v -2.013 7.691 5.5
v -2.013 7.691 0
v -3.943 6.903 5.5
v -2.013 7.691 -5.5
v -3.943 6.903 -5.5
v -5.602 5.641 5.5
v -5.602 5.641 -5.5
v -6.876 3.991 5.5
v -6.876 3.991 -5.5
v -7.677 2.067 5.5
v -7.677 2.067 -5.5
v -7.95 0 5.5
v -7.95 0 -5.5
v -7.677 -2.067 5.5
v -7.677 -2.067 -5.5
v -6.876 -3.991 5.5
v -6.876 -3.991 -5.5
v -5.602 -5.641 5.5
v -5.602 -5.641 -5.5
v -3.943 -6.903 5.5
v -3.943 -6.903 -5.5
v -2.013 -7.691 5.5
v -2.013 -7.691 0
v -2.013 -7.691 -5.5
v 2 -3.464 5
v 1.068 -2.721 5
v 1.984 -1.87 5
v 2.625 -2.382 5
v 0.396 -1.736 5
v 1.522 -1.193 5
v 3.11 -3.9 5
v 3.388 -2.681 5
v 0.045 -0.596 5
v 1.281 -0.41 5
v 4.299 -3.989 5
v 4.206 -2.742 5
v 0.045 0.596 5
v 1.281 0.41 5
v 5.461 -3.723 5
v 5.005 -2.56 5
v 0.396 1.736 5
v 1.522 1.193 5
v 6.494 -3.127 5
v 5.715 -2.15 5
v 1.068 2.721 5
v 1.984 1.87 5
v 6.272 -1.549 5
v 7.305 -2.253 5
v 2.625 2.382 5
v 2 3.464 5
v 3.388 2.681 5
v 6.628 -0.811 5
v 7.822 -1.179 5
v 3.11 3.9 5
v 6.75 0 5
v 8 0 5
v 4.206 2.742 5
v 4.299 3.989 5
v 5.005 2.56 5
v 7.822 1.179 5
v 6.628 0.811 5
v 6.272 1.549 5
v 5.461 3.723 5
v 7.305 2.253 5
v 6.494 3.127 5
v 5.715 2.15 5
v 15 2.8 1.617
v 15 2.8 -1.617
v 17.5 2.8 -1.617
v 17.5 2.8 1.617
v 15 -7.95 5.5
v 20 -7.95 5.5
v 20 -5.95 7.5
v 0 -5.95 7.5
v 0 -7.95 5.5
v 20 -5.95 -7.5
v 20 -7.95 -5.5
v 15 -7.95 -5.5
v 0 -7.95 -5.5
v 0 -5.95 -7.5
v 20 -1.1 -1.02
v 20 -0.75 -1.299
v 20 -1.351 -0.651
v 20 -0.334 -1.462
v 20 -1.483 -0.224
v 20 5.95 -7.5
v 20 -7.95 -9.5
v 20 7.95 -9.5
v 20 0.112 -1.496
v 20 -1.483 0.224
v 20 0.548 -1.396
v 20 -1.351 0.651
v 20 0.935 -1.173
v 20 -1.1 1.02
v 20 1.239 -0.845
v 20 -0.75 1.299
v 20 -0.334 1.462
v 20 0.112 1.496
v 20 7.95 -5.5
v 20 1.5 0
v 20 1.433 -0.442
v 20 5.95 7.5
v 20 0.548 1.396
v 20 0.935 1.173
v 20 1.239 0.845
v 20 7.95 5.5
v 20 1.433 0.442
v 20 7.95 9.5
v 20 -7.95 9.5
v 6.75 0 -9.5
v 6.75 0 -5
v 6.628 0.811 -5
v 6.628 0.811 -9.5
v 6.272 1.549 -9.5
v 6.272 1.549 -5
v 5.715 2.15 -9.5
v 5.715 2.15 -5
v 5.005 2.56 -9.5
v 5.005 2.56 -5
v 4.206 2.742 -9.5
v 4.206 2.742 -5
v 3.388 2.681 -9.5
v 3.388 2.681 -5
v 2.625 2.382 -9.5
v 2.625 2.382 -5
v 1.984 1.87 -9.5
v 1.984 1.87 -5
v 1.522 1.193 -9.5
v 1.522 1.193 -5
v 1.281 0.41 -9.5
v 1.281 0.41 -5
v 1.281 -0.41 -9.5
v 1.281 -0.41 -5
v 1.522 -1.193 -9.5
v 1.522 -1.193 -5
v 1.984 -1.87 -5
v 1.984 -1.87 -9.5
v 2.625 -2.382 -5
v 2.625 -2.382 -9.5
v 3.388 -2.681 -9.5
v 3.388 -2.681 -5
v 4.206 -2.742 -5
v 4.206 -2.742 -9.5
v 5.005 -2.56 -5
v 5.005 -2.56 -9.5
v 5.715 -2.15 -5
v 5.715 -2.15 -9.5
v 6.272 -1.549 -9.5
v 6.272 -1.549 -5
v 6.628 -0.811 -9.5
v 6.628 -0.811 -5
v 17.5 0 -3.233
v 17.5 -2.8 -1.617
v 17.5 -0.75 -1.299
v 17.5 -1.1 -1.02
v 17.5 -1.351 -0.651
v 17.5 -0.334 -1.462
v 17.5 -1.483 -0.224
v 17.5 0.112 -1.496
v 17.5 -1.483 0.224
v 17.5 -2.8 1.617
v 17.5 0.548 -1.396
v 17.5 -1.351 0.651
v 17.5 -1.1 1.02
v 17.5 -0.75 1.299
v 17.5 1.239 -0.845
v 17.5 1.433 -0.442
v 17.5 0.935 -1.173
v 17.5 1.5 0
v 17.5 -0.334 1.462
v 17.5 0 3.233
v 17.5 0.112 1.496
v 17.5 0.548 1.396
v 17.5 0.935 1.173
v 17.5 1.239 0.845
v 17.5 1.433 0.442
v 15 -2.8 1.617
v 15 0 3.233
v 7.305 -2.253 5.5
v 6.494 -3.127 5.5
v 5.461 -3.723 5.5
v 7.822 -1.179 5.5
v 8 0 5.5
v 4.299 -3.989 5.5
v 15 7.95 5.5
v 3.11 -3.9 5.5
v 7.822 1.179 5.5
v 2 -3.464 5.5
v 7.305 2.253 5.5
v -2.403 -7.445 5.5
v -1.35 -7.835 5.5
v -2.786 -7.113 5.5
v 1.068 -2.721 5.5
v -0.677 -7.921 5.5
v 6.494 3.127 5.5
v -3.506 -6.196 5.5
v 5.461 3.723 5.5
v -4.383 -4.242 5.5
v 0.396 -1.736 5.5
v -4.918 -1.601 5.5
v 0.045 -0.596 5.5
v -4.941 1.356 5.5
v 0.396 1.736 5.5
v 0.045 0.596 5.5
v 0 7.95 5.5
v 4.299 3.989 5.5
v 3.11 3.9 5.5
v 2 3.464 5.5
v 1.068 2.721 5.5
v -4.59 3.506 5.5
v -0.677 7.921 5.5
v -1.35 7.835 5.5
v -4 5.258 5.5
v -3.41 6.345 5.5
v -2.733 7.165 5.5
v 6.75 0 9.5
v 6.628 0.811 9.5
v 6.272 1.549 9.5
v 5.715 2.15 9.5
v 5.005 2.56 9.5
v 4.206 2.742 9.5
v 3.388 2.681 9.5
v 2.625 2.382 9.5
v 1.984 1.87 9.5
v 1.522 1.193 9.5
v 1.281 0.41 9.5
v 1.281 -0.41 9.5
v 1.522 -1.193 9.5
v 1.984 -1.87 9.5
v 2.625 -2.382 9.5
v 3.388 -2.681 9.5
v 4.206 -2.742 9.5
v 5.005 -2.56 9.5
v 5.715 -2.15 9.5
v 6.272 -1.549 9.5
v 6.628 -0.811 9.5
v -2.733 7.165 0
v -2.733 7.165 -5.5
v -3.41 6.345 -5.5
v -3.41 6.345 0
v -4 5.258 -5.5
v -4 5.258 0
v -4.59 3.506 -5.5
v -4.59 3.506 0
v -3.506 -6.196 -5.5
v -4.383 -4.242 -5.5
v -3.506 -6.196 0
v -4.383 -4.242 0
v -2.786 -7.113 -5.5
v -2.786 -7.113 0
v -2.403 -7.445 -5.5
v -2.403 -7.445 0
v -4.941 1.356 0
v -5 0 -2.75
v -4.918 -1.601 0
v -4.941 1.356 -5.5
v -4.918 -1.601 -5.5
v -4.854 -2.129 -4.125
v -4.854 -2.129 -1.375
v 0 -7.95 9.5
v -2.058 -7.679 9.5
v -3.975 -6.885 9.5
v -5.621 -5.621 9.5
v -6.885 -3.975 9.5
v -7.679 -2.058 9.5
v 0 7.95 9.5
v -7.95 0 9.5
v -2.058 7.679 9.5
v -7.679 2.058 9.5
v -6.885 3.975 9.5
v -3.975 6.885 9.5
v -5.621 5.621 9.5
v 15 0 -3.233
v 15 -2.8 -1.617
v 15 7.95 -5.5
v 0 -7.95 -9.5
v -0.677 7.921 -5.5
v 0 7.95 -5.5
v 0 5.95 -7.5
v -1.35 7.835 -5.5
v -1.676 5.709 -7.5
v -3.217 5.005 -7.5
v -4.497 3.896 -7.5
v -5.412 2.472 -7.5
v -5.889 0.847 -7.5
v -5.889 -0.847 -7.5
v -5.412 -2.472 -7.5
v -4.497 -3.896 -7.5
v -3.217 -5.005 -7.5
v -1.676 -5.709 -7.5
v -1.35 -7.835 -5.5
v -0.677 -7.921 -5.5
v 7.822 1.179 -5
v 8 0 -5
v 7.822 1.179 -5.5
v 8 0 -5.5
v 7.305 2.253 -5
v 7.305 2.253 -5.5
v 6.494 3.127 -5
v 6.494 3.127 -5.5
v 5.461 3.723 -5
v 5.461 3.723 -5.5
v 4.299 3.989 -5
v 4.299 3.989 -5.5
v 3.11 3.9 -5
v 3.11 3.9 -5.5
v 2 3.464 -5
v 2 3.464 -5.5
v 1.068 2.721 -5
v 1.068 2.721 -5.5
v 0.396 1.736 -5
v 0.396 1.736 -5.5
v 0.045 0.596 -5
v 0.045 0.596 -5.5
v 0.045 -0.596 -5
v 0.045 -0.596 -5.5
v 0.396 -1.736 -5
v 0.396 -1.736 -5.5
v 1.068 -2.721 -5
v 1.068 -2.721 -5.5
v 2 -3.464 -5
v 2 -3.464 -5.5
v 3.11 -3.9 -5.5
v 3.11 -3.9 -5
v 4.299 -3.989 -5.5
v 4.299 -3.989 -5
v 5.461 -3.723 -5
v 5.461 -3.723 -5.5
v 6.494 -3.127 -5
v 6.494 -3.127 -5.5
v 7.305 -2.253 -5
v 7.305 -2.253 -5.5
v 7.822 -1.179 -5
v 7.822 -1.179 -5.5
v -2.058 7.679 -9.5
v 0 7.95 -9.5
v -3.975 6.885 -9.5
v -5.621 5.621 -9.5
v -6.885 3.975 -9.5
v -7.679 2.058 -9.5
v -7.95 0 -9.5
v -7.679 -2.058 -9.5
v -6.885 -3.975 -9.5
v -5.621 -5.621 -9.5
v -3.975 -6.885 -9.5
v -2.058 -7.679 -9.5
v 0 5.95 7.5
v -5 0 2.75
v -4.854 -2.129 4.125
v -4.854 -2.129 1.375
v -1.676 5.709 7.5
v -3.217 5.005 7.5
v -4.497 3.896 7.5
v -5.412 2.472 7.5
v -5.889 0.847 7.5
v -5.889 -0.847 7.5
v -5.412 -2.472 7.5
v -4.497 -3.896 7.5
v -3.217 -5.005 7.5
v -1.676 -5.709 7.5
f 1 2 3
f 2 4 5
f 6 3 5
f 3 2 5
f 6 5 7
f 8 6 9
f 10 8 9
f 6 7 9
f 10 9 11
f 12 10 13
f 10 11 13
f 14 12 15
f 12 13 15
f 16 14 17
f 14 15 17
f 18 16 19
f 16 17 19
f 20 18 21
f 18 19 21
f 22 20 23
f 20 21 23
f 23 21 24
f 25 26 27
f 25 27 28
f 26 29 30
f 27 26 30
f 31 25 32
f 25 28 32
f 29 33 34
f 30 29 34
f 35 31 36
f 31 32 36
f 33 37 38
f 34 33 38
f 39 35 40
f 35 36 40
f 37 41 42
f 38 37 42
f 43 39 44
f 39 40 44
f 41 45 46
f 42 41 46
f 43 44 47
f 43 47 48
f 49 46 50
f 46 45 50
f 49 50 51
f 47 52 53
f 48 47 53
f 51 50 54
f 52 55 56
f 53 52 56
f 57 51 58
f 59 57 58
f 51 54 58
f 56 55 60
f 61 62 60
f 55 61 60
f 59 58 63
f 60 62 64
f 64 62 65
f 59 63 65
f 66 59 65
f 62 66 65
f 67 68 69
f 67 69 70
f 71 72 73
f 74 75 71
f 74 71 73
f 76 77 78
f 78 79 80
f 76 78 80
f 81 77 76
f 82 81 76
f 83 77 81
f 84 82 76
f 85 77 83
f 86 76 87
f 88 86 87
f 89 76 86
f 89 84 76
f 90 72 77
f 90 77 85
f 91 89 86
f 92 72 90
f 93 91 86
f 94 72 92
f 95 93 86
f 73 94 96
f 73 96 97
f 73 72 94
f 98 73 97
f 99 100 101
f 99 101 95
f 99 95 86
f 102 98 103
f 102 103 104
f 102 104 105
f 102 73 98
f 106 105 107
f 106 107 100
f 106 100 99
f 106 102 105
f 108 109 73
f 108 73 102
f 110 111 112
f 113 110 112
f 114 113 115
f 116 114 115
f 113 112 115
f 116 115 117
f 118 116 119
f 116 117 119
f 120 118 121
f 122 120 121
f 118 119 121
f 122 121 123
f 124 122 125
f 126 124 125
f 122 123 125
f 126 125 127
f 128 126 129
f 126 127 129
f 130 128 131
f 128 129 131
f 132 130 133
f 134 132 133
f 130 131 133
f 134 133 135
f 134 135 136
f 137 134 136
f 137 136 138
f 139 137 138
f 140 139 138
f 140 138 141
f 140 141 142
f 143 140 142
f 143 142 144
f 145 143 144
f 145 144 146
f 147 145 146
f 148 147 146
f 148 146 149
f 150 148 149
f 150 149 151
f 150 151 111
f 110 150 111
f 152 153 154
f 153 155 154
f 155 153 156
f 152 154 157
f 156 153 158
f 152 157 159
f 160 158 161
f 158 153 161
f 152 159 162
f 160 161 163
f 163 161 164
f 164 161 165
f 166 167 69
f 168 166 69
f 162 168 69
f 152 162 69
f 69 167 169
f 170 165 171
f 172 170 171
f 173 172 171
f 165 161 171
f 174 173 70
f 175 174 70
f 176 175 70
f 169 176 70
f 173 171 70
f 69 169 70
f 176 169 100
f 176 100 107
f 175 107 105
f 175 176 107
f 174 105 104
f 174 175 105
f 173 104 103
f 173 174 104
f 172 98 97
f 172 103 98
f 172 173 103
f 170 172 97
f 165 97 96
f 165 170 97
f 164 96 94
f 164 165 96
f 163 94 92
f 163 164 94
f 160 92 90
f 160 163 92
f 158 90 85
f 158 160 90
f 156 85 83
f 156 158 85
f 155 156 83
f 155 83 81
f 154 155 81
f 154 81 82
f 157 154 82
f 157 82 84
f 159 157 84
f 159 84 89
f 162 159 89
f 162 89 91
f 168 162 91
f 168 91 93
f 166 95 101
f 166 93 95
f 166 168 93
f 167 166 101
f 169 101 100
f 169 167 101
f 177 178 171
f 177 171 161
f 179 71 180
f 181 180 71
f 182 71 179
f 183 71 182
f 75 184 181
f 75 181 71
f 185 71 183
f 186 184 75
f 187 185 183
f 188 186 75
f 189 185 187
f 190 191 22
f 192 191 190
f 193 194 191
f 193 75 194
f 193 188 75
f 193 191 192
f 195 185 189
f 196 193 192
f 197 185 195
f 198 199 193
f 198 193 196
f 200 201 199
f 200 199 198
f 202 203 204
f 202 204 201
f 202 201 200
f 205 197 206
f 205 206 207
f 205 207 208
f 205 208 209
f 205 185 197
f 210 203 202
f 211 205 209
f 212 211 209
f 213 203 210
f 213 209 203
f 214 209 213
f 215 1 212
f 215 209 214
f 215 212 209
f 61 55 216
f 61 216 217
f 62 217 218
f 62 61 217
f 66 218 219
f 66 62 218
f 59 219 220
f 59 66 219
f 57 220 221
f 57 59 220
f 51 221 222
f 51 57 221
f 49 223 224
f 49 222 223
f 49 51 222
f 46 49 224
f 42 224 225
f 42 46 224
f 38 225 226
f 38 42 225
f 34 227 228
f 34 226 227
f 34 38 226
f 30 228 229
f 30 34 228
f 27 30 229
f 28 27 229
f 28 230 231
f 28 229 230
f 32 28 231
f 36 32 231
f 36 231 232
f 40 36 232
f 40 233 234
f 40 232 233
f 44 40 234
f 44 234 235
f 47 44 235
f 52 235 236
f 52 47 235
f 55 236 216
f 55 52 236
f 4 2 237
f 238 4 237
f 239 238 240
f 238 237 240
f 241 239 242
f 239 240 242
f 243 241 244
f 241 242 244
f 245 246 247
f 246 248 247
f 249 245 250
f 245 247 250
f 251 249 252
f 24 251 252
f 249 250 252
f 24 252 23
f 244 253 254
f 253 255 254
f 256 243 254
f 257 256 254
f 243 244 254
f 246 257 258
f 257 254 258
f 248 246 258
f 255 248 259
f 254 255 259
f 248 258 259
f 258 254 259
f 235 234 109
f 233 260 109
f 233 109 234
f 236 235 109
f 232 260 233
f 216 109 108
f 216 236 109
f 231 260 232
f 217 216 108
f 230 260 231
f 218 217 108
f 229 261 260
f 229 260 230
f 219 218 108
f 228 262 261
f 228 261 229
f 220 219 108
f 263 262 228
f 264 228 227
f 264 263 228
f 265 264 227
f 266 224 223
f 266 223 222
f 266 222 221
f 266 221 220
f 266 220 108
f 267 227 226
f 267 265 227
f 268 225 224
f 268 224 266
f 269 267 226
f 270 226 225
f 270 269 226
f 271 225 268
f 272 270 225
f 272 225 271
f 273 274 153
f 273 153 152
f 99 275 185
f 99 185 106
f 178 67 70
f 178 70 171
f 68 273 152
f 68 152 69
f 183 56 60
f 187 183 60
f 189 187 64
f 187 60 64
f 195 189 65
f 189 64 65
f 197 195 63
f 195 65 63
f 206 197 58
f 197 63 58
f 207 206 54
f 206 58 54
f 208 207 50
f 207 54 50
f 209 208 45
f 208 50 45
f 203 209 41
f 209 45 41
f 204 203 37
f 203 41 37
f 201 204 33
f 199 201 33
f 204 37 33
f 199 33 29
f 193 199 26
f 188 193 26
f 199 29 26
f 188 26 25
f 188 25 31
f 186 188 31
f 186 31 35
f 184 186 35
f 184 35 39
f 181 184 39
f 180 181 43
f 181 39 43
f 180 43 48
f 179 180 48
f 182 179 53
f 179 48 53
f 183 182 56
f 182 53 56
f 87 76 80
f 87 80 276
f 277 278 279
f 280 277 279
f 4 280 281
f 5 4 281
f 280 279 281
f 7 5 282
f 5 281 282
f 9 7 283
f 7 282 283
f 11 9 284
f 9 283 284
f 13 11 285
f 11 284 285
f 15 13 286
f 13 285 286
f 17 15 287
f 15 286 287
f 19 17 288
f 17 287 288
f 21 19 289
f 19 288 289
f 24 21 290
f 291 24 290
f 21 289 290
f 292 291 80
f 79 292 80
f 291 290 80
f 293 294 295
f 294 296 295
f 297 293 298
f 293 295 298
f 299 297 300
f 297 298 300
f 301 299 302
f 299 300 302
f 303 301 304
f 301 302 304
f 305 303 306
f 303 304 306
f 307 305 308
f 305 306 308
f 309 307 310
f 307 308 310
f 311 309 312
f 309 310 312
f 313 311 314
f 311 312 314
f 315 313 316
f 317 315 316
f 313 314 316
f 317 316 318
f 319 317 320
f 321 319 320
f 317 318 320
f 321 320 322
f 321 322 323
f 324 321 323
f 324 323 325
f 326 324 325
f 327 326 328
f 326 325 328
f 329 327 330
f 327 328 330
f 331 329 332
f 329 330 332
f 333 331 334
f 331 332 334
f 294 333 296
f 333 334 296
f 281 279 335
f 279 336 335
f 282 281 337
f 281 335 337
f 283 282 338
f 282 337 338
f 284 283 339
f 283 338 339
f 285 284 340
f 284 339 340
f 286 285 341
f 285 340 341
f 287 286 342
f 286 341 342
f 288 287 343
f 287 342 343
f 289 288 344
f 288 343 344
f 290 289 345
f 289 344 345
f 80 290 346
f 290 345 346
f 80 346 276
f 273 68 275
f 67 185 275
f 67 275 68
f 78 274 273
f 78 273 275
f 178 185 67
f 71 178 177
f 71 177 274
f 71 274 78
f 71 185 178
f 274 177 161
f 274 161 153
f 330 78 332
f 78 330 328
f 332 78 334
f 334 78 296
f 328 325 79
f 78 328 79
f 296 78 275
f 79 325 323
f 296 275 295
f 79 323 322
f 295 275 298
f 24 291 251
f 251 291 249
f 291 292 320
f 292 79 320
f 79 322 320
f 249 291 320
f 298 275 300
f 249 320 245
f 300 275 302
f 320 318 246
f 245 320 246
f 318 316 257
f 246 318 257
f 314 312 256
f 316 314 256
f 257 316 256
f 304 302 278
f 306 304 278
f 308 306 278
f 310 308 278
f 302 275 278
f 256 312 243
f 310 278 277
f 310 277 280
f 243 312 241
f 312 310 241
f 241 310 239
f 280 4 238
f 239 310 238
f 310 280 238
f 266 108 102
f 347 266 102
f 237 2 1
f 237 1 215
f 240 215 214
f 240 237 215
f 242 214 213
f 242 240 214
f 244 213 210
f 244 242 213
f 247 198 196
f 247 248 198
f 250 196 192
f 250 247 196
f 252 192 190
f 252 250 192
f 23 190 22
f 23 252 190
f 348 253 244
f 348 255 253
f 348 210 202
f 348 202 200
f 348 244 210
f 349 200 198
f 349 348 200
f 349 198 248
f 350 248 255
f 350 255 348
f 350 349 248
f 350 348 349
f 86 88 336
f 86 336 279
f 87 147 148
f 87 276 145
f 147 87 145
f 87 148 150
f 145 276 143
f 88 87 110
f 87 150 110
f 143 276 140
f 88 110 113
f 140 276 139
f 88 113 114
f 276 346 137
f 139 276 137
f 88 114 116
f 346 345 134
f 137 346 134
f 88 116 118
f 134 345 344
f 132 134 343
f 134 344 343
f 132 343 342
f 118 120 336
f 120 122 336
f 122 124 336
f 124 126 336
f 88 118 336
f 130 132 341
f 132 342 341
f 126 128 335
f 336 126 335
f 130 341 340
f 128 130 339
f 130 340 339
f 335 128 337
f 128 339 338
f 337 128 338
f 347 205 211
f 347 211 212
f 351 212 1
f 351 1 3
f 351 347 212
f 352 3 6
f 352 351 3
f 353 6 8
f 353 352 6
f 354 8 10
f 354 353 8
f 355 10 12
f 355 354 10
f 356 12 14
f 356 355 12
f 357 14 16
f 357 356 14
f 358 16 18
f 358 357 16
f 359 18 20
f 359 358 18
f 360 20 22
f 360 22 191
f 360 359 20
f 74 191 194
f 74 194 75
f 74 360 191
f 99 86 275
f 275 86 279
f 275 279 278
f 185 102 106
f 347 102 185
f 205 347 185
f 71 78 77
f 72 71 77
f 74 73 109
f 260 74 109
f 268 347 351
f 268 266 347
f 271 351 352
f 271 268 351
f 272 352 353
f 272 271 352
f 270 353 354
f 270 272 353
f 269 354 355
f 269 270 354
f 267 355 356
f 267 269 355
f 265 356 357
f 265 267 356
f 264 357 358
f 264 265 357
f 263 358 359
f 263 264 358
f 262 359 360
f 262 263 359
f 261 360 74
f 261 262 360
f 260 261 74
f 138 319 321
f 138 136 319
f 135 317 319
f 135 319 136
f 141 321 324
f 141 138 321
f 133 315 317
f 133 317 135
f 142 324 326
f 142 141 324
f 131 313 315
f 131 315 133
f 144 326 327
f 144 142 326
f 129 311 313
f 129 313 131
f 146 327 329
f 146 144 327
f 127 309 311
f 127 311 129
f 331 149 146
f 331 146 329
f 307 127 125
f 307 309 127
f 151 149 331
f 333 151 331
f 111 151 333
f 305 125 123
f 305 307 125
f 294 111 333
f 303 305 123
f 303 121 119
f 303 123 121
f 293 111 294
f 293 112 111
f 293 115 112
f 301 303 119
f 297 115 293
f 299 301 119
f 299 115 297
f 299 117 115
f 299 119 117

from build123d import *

# Parameters (mm, degrees)
CYLINDER_R           = 7.95
CYLINDER_DEPTH       = 11
PAD_DEPTH            = 20
BOX_W                = 20
BOX_H                = 15.9
BOX_DEPTH            = 11
SKETCH004_R          = 4
POCKET_DEPTH         = 5.5
SKETCH005_R          = 4
POCKET001_DEPTH      = 5
SKETCH006_R          = 2.75
POCKET002_DEPTH      = 9.501
POCKET002_DEPTH_BACK = 9.501
POCKET003_DEPTH      = 2.5
SKETCH008_R          = 1.5
POCKET004_DEPTH      = 5.001


with BuildPart() as structuralcilinder:
    # Cylinder → Cylinder (new body)
    with BuildSketch(Plane.XY.offset(-5.5)):
        Circle(CYLINDER_R)
    extrude(amount=CYLINDER_DEPTH)


with BuildPart() as idlerbody:
    # Sketch → Pad (new body)
    with BuildSketch(Plane.YZ):
        Polygon((0, 2), (-7.95, 2), (-5.95, 0), (-7.95, -2), (0, -2), (7.95, -2), (5.95, 0), (7.95, 2), align=None)
    extrude(amount=PAD_DEPTH)

    # Sketch002 (on DatumPlane) → AdditiveLoft section 0
    with BuildSketch(Plane.XY.offset(2)):
        with BuildLine():
            ThreePointArc((0, 7.95), (-7.95, 0), (0, -7.95))
            Line((0, 7.95), (0, -7.95))
        make_face()
    # Sketch001 → AdditiveLoft section 1
    with BuildSketch(Plane.XY):
        with BuildLine():
            ThreePointArc((0, 5.95), (-5.95, 0), (0, -5.95))
            Line((0, 5.95), (0, -5.95))
        make_face()
    # Sketch003 (on DatumPlane) → AdditiveLoft section 2
    with BuildSketch(Plane.XY.offset(-2)):
        with BuildLine():
            ThreePointArc((0, 7.95), (-7.95, 0), (0, -7.95))
            Line((0, 7.95), (0, -7.95))
        make_face()
    loft(ruled=True)


with BuildPart() as idlerbody_1:
    # Body placement: moved
    add(idlerbody.part.moved(Location((0, 0, -7.5))))


with BuildPart() as idlerbody_mirror:
    # Part__Mirroring: instance of IdlerBody
    add(idlerbody_1.part.mirror(Plane(origin=(0, 0, 0), x_dir=(0, 1, 0), z_dir=(0, 0, 1))))


with BuildPart() as finalcutsbody:
    # Box → Box (new body)
    with BuildSketch(Plane(origin=(0, -7.95, -5.5), x_dir=(1, 0, 0), z_dir=(0, 0, 1))):
        with Locations((10, 7.95)):
            Rectangle(BOX_W, BOX_H)
    extrude(amount=BOX_DEPTH)

    # Fusion: union StructuralCilinder, IdlerBody_Mirror, IdlerBody
    add(structuralcilinder.part)
    add(idlerbody_mirror.part)
    add(idlerbody_1.part)

    # Sketch004 → Pocket (cut, symmetric)
    with BuildSketch(Plane.XY):
        with BuildLine():
            Line((-1, 7.95), (0, 7.95))
            Line((0, 7.95), (15, 7.95))
            Line((15, 7.95), (15, -7.95))
            Line((15, -7.95), (0, -7.95))
            Line((0, -7.95), (-1, -7.95))
            add(Edge.make_bspline(
                [(-1, 7.95), (-5, 7.95), (-5, 0), (-5, -7.95), (-1, -7.95)],
                knots=[6.283185, 6.283185, 6.283185, 7.853982, 7.853982, 9.424778, 9.424778, 9.424778], degree=2, weights=[1, 0.707107, 1, 0.707107, 1]))
        make_face()
        with Locations((4, 0)):
            Circle(SKETCH004_R, mode=Mode.SUBTRACT)
    extrude(amount=POCKET_DEPTH, both=True, mode=Mode.SUBTRACT)

    # Sketch005 → Pocket001 (cut, symmetric)
    with BuildSketch(Plane.XY):
        with Locations((4, 0)):
            Circle(SKETCH005_R)
    extrude(amount=POCKET001_DEPTH, both=True, mode=Mode.SUBTRACT)

    # Sketch006 → Pocket002 (cut, two sides)
    with BuildSketch(Plane.XY) as pocket002_sk:
        with Locations((4, 0)):
            Circle(SKETCH006_R)
    extrude(amount=-POCKET002_DEPTH, mode=Mode.SUBTRACT)
    extrude(pocket002_sk.sketch, amount=POCKET002_DEPTH_BACK, mode=Mode.SUBTRACT)

    # Sketch007 (on DatumPlane) → Pocket003 (cut)
    with BuildSketch(Plane.YZ.offset(15)):
        Polygon((2.8, -1.616581), (2.8, 1.616581), (0, 3.233162), (-2.8, 1.616581), (-2.8, -1.616581), (0, -3.233162), align=None)
    extrude(amount=POCKET003_DEPTH, mode=Mode.SUBTRACT)

    # Sketch008 (on DatumPlane) → Pocket004 (cut, through all)
    with BuildSketch(Plane.YZ.offset(15)):
        Circle(SKETCH008_R)
    extrude(amount=POCKET004_DEPTH, mode=Mode.SUBTRACT)


solid = finalcutsbody.part
